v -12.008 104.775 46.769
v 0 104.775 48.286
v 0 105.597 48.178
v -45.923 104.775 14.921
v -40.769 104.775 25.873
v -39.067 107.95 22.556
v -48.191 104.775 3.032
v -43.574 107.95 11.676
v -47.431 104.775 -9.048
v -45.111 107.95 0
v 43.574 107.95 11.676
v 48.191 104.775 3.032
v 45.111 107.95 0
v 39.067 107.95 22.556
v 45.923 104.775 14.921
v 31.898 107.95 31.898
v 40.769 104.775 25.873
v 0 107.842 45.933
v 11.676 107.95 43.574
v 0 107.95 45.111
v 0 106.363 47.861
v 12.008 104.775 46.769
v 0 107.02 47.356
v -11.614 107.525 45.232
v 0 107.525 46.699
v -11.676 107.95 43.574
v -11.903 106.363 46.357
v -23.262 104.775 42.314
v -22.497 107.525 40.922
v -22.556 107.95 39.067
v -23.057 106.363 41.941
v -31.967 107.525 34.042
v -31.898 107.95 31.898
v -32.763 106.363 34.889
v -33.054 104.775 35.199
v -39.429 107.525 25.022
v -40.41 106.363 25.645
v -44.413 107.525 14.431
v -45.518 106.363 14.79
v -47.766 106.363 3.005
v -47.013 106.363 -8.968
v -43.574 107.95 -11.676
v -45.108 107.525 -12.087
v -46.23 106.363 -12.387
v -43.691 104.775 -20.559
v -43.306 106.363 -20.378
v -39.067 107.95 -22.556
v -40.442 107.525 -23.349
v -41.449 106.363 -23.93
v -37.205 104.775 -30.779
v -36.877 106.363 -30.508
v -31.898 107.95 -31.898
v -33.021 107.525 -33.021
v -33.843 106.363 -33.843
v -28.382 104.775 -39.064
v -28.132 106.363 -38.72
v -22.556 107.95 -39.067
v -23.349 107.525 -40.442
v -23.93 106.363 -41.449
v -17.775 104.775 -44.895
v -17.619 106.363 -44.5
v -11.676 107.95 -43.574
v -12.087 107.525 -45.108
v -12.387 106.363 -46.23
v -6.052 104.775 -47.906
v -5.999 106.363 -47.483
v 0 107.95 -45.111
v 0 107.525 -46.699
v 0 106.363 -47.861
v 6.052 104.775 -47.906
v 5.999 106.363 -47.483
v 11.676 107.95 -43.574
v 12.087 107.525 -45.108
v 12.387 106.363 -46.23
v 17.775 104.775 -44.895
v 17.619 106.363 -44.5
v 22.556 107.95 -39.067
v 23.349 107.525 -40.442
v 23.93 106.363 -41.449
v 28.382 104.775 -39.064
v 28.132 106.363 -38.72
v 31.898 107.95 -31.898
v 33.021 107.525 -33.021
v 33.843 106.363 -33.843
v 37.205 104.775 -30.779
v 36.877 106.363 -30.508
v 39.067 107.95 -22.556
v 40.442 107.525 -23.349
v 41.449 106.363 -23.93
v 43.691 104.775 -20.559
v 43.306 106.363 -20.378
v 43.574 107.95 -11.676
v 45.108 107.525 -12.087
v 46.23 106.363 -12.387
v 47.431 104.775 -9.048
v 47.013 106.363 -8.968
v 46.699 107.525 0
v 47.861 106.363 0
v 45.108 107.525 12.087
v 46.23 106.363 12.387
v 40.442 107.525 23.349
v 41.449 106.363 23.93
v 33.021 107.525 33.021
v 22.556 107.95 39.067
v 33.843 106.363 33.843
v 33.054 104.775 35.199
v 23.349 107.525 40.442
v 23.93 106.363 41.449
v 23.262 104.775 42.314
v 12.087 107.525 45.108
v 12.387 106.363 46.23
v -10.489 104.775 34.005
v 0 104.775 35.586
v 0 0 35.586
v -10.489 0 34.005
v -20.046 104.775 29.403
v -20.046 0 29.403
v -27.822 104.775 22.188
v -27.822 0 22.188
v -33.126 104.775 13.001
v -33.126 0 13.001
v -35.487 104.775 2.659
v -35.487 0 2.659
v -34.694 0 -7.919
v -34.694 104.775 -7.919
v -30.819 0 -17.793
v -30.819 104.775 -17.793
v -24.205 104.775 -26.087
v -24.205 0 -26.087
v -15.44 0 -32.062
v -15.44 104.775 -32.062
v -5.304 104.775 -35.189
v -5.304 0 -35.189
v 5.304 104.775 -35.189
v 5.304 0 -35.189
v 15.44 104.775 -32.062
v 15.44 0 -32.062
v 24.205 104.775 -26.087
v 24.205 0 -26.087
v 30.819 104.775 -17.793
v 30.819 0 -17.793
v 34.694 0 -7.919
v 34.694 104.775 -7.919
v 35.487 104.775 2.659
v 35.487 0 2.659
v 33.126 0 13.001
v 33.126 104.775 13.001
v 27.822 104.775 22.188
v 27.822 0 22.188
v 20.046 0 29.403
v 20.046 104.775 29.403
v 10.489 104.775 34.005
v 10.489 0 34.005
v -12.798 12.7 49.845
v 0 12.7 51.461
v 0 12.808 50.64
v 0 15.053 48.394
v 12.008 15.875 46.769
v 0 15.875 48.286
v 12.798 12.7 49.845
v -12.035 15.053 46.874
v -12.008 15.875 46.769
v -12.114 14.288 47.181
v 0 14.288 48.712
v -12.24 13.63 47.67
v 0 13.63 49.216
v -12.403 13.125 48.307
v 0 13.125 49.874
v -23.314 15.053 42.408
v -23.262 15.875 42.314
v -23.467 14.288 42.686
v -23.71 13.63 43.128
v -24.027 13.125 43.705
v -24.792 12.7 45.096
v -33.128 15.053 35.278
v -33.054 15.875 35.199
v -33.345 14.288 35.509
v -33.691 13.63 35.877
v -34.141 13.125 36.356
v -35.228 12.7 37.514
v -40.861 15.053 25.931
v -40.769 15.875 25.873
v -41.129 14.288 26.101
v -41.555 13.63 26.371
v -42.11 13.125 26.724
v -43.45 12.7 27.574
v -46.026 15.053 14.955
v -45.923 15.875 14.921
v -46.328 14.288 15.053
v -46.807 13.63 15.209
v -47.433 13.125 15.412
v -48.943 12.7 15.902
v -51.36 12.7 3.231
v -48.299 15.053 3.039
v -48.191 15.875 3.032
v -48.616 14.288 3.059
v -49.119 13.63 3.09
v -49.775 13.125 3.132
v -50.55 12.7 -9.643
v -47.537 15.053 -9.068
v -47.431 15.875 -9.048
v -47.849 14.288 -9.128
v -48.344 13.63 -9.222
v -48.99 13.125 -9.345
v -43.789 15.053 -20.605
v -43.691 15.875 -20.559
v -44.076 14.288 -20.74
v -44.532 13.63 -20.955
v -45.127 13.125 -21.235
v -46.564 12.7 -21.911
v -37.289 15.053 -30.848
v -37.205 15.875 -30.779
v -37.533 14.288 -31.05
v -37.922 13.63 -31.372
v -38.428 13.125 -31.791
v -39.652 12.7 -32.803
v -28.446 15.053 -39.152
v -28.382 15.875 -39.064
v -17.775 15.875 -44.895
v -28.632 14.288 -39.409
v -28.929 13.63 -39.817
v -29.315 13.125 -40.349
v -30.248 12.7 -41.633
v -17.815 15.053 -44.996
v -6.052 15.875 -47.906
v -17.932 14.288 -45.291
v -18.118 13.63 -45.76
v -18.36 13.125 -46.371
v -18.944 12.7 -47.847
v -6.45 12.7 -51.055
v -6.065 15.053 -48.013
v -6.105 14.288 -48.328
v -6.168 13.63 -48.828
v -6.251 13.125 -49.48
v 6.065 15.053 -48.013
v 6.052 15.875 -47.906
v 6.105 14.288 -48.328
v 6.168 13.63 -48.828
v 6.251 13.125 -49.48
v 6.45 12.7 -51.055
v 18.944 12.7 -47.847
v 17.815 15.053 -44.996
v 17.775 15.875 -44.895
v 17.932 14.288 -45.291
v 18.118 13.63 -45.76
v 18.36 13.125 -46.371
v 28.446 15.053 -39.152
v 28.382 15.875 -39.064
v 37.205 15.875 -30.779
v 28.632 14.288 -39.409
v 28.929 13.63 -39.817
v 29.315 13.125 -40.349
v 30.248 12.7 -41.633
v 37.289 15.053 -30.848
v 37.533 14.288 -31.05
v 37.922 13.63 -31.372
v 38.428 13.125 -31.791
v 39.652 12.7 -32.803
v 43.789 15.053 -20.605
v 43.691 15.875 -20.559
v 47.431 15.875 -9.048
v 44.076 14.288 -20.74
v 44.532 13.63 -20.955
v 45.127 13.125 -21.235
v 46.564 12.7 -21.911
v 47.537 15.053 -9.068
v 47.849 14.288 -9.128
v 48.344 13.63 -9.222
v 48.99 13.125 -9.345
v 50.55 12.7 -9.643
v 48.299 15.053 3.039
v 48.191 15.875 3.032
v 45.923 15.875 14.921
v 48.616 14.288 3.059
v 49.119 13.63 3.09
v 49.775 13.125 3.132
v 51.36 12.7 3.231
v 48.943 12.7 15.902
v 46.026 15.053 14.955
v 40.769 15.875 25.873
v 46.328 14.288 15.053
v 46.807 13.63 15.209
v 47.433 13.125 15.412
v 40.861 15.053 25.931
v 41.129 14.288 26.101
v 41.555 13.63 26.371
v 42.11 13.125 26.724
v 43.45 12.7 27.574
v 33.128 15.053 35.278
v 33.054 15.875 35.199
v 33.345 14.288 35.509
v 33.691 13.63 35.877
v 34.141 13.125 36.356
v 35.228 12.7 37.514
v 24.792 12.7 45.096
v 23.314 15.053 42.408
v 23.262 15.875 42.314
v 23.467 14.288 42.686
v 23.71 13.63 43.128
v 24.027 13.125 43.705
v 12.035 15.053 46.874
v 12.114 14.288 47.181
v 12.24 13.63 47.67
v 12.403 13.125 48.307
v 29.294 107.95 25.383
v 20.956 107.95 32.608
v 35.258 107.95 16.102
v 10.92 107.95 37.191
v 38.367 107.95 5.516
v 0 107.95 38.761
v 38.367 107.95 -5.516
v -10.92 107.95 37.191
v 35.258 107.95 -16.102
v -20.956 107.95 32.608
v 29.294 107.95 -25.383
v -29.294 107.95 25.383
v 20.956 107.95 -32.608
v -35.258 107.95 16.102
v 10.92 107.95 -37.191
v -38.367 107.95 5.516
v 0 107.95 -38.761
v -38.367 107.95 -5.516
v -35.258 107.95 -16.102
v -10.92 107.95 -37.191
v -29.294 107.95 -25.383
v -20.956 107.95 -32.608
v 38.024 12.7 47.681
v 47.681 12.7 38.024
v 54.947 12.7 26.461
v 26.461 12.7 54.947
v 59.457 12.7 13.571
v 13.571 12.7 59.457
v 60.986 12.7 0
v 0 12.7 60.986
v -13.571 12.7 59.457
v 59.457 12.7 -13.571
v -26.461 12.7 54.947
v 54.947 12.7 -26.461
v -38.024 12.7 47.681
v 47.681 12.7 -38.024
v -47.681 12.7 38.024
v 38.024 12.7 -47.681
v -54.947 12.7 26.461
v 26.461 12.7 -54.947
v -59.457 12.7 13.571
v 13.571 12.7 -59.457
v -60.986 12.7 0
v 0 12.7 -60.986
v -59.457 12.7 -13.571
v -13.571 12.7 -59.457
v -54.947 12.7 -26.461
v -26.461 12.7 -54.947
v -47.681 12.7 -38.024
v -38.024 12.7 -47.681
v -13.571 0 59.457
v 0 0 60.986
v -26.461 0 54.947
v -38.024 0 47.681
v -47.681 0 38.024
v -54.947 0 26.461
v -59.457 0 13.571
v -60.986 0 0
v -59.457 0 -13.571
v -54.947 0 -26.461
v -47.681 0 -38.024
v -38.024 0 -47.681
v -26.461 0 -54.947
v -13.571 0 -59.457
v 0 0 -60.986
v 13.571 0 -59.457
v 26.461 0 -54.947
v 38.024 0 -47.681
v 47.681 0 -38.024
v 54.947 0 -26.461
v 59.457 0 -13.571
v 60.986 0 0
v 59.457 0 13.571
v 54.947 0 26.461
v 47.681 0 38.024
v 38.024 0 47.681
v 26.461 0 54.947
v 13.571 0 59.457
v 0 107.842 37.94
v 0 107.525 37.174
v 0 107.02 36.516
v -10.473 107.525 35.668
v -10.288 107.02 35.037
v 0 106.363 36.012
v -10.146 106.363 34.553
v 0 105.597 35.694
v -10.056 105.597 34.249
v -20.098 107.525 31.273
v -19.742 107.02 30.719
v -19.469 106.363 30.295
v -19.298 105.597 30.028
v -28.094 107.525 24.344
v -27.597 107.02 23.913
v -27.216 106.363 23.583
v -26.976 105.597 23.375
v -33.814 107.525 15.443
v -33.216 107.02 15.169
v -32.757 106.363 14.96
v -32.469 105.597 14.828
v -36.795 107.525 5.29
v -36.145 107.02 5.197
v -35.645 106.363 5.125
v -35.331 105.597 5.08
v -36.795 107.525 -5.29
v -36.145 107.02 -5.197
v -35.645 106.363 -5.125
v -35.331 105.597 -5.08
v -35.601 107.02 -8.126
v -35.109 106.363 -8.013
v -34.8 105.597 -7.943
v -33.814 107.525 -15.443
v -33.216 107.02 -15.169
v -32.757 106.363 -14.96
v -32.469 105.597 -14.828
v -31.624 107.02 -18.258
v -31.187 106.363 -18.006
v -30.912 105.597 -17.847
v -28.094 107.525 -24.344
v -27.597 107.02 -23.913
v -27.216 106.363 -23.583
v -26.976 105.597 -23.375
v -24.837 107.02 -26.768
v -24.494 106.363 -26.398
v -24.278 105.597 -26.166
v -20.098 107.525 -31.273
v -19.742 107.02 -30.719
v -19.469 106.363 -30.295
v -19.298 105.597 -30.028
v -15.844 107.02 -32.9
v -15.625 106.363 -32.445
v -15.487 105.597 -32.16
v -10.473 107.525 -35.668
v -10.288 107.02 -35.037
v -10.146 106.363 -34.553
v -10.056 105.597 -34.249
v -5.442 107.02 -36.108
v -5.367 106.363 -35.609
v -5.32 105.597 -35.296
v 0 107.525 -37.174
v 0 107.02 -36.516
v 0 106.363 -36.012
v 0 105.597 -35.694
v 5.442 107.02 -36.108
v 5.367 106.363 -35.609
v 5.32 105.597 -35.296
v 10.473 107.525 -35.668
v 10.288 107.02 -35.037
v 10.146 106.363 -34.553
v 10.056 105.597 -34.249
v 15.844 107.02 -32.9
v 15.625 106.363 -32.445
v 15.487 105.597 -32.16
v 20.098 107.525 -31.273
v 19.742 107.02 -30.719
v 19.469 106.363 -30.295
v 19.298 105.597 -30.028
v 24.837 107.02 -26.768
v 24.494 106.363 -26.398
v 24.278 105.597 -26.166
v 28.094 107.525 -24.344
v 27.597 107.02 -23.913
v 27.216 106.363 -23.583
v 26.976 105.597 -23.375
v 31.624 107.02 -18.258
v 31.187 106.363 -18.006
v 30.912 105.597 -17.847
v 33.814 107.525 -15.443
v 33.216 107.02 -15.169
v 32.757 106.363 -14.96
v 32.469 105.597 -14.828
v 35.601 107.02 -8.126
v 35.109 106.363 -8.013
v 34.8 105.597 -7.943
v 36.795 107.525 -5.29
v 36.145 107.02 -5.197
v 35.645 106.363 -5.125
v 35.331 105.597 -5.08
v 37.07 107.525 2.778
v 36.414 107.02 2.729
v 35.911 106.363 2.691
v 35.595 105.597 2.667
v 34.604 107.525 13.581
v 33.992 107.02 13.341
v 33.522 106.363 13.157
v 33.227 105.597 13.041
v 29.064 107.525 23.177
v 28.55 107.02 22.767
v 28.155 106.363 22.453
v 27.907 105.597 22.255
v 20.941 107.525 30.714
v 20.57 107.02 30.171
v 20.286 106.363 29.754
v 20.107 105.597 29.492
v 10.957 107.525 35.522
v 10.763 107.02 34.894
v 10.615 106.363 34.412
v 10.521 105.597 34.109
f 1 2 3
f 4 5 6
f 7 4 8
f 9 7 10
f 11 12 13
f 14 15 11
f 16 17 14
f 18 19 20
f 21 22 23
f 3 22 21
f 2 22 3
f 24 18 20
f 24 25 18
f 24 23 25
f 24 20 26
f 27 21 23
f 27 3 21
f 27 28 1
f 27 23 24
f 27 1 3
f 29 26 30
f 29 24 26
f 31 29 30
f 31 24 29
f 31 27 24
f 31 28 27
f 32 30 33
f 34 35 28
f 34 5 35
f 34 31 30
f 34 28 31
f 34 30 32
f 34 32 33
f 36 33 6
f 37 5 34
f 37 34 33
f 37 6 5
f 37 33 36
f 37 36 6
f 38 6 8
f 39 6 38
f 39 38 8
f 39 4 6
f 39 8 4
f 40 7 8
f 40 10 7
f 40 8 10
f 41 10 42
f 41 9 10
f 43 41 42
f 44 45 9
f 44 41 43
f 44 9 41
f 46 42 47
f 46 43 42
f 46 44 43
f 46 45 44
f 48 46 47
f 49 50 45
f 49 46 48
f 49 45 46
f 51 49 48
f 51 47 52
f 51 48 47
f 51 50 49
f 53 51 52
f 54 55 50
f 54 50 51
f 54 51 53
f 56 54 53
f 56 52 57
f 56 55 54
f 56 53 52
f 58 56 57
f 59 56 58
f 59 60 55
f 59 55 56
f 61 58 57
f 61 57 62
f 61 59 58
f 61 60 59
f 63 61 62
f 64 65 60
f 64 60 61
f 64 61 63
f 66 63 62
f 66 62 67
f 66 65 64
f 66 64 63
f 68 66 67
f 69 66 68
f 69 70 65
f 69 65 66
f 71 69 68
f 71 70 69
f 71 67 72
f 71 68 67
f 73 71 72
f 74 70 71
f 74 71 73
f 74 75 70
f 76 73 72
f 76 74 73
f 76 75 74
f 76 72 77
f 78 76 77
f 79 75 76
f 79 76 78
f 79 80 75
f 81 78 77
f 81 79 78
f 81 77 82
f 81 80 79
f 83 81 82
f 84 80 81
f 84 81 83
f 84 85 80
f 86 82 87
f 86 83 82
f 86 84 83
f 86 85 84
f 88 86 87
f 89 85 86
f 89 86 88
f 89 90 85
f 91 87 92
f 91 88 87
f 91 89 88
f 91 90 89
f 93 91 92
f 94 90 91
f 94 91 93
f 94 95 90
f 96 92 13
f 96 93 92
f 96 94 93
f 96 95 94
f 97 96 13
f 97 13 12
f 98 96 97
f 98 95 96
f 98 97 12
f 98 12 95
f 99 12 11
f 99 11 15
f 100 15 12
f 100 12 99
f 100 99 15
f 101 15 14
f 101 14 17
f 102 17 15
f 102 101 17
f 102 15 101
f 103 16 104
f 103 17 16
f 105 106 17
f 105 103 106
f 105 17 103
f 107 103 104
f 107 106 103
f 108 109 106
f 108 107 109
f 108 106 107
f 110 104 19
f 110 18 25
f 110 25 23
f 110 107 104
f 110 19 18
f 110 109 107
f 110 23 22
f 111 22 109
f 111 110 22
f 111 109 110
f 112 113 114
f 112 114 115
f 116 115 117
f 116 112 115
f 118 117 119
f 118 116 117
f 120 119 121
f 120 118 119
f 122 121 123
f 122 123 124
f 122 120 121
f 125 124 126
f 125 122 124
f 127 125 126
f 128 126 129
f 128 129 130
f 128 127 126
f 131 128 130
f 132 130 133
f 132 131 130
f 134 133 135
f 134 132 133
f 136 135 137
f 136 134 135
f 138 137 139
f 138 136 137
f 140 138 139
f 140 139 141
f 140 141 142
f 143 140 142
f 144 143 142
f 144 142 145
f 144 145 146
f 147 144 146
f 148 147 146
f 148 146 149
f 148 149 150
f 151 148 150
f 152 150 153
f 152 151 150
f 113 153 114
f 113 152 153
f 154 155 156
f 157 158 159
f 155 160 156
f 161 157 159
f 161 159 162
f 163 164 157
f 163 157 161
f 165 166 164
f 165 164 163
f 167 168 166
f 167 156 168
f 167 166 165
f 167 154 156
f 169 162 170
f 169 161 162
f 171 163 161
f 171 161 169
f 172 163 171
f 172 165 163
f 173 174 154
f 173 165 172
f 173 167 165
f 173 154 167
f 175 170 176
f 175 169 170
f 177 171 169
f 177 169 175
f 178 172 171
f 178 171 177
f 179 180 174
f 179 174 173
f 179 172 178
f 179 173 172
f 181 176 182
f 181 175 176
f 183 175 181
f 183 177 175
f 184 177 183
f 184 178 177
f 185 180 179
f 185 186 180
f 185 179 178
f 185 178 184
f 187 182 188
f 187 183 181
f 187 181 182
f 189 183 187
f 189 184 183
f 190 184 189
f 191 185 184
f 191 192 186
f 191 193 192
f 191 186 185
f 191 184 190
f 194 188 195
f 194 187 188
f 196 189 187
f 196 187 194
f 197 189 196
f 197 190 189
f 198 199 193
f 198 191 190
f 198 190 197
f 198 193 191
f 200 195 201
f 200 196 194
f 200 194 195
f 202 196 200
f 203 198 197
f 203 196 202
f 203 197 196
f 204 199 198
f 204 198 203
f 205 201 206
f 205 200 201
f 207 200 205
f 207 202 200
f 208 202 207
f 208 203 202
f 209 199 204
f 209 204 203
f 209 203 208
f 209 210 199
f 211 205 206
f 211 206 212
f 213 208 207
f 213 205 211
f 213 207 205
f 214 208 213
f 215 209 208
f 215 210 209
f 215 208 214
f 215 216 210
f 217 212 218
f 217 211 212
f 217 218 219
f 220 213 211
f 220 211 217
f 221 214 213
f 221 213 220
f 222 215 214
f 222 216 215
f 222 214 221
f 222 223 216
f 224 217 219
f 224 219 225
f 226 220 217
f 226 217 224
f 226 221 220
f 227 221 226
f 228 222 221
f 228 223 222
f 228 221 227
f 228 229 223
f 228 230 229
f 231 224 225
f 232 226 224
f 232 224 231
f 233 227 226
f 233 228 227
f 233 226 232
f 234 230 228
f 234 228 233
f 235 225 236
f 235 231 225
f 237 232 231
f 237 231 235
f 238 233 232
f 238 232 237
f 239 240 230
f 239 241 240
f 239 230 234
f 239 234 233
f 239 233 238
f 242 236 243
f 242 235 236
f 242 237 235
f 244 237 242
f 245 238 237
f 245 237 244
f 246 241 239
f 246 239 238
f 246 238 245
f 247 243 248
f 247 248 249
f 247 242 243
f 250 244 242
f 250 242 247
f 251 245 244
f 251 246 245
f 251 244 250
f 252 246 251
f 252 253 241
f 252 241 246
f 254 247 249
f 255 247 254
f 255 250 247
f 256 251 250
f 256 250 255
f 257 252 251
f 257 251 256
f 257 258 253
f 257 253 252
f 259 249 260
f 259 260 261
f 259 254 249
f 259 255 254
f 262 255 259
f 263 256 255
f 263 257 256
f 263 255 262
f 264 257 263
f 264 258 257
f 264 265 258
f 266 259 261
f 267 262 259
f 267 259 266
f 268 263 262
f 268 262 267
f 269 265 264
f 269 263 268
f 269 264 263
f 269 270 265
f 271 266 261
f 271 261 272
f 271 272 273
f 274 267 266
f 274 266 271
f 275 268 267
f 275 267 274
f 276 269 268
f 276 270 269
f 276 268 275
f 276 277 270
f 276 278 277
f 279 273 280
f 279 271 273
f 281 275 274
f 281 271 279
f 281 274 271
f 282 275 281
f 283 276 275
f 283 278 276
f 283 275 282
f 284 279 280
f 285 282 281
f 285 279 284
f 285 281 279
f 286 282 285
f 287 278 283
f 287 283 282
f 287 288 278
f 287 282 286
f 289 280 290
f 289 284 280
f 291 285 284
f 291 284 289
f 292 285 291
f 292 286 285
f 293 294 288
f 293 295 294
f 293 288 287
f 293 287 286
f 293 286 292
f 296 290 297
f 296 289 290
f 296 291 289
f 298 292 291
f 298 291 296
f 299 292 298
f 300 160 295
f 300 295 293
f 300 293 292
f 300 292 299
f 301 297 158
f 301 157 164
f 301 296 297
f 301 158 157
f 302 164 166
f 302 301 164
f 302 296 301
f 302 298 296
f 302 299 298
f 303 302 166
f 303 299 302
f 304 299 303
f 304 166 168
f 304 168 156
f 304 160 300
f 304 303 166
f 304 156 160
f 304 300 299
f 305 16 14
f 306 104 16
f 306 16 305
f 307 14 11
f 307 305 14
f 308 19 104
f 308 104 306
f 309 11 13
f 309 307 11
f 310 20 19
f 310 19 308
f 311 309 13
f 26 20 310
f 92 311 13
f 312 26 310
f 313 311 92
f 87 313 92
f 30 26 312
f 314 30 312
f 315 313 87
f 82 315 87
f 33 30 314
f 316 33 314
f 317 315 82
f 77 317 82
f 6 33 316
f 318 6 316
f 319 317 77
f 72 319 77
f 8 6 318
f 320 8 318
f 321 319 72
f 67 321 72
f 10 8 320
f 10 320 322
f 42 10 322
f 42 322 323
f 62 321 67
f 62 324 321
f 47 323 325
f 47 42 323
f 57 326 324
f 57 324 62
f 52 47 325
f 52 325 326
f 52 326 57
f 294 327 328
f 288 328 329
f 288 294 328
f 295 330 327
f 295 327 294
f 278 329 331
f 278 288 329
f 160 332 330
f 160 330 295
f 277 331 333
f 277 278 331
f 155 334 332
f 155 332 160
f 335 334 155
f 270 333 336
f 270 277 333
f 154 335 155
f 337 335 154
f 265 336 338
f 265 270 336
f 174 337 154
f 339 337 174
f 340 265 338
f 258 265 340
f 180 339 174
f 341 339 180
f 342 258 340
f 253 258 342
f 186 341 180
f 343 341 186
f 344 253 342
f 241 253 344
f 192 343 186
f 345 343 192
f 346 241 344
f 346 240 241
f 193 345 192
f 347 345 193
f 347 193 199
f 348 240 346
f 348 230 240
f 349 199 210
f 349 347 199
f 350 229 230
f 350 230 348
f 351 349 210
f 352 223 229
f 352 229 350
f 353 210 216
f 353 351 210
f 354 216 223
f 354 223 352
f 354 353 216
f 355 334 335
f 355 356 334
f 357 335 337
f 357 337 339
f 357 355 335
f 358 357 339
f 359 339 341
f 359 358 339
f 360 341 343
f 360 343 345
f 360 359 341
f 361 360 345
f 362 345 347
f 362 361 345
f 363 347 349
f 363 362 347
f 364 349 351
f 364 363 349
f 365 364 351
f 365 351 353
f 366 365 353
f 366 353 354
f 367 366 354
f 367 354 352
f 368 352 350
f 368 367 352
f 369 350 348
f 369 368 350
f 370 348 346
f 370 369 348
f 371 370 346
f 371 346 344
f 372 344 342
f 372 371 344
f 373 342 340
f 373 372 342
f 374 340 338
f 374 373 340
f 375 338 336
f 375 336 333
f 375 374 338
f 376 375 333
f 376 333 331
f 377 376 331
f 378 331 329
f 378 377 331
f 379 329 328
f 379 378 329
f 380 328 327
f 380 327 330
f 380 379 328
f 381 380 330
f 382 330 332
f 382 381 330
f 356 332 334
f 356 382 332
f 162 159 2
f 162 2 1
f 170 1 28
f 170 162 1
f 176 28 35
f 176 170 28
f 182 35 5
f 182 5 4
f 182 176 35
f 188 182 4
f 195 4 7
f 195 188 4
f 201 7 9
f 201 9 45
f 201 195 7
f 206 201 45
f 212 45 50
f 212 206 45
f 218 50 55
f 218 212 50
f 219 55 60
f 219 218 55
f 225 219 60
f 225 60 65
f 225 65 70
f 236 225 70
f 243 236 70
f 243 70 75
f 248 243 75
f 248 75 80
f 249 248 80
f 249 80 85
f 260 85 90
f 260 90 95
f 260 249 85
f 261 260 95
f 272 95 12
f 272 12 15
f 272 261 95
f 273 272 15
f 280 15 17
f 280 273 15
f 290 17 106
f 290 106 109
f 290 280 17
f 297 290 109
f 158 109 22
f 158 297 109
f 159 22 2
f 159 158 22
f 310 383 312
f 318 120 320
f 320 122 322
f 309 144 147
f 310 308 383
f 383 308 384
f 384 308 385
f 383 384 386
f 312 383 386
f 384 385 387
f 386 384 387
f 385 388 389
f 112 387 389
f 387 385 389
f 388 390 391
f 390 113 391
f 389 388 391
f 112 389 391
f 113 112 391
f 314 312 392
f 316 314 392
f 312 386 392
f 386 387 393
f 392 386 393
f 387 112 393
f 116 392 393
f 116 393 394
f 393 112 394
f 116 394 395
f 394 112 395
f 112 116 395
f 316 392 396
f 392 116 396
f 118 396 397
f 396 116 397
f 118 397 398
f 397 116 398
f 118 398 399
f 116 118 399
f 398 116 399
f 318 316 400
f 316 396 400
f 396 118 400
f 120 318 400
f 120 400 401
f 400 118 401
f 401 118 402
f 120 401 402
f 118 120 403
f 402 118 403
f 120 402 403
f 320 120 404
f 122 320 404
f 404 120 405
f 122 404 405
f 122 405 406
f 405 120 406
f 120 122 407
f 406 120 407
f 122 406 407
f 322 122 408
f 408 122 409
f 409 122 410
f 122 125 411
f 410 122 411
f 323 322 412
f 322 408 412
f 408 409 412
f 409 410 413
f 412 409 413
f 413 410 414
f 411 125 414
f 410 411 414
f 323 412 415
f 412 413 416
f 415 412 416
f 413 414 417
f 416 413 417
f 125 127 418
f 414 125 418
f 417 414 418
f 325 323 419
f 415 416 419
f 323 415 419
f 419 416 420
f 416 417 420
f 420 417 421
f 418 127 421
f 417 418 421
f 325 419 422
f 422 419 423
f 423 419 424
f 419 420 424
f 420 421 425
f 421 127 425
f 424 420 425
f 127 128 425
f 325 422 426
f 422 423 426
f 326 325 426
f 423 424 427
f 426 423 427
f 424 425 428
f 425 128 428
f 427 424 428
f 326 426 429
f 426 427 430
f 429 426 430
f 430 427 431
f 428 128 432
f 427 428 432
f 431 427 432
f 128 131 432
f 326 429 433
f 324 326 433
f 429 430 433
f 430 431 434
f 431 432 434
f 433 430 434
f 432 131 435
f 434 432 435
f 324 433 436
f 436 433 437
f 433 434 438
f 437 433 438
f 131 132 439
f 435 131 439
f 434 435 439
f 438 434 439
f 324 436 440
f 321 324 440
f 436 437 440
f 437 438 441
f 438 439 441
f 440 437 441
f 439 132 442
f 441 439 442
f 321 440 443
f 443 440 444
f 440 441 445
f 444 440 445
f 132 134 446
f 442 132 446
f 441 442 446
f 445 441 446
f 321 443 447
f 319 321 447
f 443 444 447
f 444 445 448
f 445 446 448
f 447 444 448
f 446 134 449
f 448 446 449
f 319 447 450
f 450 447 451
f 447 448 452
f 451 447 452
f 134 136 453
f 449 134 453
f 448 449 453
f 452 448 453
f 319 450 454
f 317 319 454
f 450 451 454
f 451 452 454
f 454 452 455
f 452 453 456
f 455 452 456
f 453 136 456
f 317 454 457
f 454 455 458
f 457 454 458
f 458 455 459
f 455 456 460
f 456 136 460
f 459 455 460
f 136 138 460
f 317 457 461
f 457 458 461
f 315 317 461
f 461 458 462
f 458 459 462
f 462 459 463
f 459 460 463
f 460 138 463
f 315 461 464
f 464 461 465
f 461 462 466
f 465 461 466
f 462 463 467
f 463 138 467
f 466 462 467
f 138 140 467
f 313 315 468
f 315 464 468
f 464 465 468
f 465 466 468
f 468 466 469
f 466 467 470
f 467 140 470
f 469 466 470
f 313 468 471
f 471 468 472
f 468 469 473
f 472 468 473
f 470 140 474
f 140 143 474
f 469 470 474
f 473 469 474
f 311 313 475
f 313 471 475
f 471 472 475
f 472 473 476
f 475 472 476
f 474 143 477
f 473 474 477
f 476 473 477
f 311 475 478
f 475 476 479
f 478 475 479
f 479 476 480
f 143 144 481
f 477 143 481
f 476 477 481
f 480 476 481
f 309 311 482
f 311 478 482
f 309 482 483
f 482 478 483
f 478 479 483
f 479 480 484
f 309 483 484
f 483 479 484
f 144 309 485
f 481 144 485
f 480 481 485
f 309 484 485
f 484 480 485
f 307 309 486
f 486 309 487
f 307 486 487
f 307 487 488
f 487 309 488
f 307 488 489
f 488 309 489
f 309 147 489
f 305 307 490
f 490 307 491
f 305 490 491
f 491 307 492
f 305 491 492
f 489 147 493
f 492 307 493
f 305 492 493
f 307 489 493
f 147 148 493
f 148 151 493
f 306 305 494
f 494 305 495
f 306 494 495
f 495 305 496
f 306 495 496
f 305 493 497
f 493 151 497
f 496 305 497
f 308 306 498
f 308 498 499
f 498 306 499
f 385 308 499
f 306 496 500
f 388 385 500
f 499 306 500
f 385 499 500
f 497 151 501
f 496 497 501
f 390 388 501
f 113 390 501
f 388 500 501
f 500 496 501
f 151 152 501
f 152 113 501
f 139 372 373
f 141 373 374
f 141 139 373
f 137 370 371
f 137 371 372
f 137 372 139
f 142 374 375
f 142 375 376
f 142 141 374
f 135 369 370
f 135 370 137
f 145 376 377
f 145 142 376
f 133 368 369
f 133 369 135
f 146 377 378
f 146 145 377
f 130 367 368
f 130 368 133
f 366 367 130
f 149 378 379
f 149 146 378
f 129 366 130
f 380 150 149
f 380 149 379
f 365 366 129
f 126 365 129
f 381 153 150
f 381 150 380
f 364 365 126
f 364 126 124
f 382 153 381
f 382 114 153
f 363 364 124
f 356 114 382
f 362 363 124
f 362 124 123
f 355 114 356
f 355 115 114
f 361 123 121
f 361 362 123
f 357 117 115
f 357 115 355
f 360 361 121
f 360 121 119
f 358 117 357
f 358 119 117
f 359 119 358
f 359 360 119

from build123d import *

# Parameters (mm, degrees)
FILLET1_R = 3.175


with BuildPart() as part:
    # Sketch1 → Revolve1 (revolve)
    with BuildSketch(Plane.XY, mode=Mode.PRIVATE) as revolve1_sk:
        Polygon((35.586256664, 107.95), (48.286256664, 107.95), (48.286256664, 12.7), (60.986256664, 12.7), (60.986256664, 0), (35.586256664, 0), align=None)
    revolve(revolve1_sk.sketch.rotate(Axis((0, 107.95, 0), (0, -1, 0)), 90), axis=Axis((0, 107.95, 0), (0, -1, 0)))

    # Fillet1
    fillet1_edges = [part.edges().sort_by_distance(p)[0] for p in [
        (0, 107.95, -35.586256664),
        (0, 107.95, -48.286256664),
        (0, 12.7, -48.286256664),
    ]]
    fillet(fillet1_edges, radius=FILLET1_R)


solid = part.part
